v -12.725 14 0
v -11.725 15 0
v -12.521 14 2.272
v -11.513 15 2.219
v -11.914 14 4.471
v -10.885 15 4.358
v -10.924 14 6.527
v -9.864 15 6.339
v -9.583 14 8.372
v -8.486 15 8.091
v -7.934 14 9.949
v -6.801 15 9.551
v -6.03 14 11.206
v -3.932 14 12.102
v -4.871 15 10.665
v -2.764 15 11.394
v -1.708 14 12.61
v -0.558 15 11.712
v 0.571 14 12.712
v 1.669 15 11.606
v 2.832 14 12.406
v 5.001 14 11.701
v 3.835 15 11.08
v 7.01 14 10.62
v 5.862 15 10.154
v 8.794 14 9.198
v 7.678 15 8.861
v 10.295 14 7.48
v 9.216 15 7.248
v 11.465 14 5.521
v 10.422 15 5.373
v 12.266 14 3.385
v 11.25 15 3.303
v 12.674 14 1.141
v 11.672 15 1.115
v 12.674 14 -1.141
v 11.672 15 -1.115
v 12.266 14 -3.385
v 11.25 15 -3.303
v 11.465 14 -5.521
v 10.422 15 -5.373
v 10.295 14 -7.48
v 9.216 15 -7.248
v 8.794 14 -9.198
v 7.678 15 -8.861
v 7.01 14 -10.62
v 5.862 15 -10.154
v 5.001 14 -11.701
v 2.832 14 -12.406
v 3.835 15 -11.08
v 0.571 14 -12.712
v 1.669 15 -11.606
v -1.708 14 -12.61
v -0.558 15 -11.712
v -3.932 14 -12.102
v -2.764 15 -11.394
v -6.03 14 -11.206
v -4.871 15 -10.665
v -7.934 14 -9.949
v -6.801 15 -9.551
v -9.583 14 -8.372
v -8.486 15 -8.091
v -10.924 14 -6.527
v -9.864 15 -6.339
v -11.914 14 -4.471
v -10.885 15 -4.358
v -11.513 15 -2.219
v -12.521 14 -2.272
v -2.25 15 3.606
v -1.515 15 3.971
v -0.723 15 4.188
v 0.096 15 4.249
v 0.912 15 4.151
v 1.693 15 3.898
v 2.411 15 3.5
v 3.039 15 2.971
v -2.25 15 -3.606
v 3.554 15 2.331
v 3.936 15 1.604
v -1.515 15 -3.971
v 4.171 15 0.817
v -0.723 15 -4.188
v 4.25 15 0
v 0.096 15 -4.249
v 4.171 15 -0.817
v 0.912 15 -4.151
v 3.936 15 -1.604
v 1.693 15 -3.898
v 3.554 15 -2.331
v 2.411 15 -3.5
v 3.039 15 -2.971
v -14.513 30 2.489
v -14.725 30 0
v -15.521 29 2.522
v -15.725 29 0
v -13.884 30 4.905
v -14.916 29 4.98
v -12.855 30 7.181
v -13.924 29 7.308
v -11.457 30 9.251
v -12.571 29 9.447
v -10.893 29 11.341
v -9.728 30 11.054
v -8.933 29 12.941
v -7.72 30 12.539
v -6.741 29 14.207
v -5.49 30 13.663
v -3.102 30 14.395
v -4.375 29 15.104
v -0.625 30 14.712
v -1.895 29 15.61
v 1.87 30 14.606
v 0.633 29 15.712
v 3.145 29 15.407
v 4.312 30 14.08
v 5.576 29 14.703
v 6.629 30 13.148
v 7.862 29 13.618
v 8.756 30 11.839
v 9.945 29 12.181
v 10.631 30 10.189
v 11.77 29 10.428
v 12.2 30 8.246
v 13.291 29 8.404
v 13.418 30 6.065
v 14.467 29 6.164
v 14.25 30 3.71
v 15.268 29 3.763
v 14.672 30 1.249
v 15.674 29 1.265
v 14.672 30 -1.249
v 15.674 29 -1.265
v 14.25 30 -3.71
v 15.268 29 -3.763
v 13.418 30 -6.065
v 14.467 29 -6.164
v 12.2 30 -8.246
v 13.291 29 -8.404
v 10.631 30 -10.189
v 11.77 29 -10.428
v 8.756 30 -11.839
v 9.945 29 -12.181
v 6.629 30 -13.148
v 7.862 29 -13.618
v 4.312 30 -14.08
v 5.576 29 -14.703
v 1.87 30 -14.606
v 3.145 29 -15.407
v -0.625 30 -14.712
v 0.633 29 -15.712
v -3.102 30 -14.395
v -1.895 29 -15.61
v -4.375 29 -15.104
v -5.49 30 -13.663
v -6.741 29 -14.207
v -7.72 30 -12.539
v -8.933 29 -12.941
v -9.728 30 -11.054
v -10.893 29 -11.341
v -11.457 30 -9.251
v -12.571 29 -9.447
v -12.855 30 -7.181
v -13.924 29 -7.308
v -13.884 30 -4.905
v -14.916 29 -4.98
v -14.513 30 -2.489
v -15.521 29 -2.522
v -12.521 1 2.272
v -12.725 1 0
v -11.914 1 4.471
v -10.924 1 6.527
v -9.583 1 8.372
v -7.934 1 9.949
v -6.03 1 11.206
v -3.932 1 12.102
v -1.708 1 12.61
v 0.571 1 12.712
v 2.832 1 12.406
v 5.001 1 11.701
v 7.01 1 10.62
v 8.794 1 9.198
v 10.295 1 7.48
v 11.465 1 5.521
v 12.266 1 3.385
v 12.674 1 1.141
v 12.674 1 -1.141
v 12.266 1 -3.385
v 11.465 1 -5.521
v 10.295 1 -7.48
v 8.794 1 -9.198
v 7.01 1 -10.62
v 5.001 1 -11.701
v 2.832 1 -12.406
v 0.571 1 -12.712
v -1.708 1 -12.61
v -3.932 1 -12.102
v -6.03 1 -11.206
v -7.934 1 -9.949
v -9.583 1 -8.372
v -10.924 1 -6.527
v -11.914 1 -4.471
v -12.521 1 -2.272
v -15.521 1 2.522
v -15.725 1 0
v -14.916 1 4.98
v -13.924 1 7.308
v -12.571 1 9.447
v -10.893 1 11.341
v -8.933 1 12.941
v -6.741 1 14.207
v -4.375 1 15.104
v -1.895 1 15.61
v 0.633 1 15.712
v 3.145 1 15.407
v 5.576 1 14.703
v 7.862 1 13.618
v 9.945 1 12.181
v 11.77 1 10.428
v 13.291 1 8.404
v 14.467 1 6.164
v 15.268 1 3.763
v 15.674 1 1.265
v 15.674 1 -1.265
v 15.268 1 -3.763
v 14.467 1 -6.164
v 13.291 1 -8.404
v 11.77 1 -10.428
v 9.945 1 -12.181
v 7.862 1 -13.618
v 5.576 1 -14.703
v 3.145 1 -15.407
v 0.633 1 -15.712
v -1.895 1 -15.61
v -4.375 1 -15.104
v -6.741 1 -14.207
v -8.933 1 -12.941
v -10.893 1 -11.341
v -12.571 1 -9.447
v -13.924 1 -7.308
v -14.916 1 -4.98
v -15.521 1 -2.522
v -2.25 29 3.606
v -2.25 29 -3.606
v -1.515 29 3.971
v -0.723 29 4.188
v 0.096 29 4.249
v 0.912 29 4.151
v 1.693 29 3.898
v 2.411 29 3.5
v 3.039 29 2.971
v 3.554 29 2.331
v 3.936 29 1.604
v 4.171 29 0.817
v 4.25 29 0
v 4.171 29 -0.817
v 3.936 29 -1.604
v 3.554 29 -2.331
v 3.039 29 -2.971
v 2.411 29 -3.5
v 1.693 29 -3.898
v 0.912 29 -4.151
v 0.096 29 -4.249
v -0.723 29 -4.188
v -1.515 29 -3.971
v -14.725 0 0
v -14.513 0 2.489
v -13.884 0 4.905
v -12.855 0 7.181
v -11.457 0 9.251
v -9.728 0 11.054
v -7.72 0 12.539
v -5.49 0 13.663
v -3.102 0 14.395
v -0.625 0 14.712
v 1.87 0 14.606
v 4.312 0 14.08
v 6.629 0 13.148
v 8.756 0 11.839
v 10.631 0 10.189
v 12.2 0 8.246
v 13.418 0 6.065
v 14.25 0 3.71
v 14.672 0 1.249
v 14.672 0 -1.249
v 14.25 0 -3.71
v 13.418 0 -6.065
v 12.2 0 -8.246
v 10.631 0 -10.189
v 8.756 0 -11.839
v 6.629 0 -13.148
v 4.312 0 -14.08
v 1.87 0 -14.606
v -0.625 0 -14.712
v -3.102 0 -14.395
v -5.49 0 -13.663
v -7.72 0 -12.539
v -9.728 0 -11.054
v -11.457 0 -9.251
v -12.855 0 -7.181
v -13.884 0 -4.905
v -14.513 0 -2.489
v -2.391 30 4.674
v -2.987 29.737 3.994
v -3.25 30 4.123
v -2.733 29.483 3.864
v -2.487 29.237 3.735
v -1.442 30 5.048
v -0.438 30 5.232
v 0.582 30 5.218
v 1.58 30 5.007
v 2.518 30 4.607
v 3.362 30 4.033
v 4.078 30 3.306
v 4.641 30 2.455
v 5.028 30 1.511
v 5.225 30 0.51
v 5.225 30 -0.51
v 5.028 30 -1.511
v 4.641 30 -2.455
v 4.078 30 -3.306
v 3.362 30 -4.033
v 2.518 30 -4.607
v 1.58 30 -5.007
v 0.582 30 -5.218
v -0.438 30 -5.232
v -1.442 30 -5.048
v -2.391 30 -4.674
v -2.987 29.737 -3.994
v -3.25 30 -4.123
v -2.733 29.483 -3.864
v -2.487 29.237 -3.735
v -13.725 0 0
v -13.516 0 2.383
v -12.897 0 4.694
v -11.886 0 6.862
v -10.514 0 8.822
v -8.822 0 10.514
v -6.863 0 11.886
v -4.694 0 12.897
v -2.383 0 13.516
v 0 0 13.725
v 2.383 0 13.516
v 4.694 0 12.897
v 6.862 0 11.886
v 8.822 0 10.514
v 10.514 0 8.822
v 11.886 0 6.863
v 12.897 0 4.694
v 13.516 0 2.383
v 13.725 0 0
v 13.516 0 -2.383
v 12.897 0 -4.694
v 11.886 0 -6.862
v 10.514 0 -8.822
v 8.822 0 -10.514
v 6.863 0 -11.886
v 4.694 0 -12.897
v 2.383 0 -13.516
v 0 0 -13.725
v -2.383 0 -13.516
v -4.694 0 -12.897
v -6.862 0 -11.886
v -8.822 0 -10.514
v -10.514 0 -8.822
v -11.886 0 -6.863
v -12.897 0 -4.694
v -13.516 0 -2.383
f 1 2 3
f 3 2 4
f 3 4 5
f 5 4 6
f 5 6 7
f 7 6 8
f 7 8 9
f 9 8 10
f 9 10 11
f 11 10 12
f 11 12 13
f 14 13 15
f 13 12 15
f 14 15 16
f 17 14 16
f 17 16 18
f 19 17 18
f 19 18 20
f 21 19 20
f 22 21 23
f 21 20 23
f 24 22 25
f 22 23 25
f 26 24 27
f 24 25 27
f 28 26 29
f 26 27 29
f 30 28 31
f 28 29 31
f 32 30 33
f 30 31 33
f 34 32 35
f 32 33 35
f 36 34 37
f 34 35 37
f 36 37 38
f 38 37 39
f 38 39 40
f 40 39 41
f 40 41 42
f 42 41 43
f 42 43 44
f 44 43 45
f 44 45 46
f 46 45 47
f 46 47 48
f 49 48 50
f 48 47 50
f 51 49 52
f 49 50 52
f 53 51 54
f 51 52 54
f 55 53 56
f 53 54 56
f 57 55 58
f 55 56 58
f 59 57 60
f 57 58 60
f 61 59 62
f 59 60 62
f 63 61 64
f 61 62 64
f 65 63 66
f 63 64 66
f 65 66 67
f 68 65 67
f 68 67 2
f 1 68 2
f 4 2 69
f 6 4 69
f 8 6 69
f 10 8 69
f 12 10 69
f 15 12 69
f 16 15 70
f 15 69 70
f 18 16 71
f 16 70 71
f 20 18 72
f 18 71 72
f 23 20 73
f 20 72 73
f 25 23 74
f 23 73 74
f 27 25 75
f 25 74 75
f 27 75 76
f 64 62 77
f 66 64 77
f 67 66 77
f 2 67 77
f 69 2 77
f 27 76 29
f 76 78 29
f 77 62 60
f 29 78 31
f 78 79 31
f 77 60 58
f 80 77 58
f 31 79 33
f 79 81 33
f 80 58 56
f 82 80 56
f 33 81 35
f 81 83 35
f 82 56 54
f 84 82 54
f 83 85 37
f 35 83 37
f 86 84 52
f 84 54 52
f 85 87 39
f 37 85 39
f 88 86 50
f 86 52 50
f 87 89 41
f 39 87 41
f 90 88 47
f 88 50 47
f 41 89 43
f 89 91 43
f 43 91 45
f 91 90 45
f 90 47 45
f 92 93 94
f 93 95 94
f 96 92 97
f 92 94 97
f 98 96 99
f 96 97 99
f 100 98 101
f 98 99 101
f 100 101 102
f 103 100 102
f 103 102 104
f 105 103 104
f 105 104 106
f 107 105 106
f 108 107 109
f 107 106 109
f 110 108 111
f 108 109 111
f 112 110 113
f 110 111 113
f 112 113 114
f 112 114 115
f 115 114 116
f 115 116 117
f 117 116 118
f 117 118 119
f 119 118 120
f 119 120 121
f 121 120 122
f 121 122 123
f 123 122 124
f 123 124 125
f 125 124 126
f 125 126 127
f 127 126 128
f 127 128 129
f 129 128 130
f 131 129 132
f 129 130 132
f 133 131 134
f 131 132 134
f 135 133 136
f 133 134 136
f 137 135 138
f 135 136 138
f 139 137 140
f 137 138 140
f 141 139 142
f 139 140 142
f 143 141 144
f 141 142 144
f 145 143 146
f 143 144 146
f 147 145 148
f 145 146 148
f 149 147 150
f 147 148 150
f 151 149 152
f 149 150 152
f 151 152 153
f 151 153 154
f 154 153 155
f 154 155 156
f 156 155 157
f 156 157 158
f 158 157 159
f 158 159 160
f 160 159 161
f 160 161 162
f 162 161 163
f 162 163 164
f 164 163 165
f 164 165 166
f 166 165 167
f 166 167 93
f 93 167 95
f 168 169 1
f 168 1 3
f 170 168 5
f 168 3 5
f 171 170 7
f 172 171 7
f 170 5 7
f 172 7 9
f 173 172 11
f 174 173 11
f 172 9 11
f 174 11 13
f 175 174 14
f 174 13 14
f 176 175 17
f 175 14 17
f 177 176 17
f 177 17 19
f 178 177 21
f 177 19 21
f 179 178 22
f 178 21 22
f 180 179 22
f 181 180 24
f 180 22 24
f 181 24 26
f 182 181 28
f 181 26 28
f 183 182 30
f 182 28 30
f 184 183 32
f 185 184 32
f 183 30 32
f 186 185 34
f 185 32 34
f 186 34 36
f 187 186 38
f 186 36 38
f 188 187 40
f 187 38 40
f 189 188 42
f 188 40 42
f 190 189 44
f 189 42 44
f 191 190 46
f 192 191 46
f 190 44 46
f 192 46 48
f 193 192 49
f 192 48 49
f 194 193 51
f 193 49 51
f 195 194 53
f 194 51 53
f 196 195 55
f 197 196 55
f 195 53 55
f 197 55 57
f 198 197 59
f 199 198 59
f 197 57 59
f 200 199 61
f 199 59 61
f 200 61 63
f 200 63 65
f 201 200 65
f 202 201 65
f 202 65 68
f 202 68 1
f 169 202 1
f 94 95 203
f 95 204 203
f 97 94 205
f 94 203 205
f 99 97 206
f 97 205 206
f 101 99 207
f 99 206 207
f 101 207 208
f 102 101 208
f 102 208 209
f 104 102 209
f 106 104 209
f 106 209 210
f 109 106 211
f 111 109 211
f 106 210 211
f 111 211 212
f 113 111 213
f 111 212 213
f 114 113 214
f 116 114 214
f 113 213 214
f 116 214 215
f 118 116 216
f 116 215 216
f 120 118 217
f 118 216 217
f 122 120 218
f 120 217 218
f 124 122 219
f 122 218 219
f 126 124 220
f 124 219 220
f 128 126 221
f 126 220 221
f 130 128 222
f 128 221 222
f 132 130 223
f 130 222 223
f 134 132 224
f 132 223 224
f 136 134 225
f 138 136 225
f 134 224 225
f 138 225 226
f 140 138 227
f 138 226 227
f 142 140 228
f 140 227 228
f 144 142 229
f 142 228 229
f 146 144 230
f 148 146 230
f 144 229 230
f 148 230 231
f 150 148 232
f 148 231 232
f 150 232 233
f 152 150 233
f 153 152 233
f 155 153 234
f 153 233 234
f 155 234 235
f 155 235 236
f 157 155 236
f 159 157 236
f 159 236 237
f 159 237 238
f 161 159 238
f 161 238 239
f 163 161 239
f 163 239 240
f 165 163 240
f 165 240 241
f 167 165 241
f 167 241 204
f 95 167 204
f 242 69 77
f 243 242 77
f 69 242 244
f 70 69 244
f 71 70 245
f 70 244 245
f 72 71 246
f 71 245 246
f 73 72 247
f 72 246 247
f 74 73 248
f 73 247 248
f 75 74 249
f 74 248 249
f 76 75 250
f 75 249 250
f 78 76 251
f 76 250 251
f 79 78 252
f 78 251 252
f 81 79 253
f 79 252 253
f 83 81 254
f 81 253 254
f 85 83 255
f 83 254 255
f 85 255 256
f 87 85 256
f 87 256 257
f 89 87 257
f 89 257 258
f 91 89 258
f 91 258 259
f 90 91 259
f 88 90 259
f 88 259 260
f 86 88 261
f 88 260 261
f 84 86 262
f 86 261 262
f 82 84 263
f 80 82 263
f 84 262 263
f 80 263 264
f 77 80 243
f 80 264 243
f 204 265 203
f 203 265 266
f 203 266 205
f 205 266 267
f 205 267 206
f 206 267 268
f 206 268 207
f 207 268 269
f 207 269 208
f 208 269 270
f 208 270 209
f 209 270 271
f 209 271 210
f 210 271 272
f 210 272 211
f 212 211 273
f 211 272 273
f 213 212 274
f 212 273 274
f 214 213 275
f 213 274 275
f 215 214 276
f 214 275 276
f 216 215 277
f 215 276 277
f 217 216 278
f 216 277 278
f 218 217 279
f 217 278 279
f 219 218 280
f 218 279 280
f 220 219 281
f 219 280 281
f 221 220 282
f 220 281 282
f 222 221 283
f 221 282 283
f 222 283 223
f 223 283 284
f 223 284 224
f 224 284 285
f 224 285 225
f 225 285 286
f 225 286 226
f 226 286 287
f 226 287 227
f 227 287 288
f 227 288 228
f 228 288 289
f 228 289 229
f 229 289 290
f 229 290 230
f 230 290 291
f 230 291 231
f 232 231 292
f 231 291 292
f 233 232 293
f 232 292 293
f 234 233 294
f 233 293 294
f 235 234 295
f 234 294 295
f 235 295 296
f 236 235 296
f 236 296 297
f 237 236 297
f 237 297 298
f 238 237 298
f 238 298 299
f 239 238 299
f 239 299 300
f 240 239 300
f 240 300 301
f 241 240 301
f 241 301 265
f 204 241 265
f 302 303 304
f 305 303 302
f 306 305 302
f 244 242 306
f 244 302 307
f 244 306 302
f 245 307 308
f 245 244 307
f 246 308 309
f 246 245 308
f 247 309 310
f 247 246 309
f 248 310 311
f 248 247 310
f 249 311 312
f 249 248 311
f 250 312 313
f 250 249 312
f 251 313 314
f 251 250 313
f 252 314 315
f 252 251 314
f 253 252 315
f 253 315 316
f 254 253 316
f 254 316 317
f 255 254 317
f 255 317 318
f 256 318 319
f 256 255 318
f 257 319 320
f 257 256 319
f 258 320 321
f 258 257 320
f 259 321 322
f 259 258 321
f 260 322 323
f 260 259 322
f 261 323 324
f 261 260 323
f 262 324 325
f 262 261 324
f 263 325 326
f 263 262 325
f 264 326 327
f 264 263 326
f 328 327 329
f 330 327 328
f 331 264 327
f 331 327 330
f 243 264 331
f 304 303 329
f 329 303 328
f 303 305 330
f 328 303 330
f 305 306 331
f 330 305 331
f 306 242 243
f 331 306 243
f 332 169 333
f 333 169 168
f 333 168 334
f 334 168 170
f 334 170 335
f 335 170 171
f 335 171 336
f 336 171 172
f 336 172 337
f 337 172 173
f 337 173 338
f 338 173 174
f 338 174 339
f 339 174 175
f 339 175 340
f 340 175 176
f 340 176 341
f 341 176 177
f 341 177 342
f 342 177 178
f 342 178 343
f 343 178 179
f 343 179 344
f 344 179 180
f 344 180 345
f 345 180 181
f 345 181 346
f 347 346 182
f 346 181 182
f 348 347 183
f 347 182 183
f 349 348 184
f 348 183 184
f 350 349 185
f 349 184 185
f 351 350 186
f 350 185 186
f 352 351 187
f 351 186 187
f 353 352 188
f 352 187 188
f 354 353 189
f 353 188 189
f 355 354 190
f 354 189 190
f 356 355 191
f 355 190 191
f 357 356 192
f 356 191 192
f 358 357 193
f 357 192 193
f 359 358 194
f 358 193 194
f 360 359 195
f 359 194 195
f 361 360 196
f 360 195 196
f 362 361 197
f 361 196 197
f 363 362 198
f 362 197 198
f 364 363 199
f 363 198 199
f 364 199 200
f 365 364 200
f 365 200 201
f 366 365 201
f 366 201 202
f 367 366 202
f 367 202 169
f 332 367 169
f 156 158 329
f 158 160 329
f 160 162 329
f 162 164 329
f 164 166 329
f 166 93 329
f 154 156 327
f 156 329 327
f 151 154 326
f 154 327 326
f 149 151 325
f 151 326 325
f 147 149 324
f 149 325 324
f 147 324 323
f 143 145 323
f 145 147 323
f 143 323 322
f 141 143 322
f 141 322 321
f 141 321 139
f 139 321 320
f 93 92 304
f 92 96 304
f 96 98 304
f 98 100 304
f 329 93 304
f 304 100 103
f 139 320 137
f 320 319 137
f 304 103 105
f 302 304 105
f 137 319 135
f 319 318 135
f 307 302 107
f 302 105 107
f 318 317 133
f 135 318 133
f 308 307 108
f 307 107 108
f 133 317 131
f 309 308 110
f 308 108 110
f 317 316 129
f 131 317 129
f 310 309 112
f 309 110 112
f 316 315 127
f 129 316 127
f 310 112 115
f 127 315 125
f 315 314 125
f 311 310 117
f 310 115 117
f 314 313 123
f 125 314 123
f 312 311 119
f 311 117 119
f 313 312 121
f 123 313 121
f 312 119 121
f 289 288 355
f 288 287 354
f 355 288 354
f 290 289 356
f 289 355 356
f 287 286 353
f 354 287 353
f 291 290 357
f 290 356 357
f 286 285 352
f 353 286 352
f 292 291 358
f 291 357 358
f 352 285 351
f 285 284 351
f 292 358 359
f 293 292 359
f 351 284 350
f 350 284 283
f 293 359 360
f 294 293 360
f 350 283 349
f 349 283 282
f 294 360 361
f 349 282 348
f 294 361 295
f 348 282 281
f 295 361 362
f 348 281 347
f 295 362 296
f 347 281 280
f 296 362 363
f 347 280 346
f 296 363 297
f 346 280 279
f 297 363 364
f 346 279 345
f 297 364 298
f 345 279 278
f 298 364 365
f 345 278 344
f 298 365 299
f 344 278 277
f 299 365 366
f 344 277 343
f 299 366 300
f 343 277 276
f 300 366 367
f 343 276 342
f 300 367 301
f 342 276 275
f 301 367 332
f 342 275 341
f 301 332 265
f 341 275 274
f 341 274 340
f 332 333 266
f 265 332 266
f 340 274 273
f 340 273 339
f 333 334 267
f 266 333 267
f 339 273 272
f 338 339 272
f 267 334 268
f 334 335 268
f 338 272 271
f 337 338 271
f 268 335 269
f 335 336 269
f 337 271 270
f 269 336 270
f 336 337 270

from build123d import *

# Parameters (mm, degrees)
CROQUIS3_W              = 4
CROQUIS3_H              = 7.21110255
SALIENTE_EXTRUIR1_DEPTH = 15
CHAFL_N1_SIZE           = 1


with BuildPart() as part:
    # Croquis2 → Revolución1 (revolve)
    with BuildSketch(Plane.XY):
        Polygon((-4.25, 30), (-14.725, 30), (-15.725, 29), (-15.725, 1), (-14.725, 0), (-13.725, 0), (-12.725, 1), (-12.725, 14), (-11.725, 15), (-4.25, 15), align=None)
    revolve(axis=Axis((0, 0, 0), (0, 1, 0)))

    # Croquis3 → Saliente-Extruir1 (add)
    with BuildSketch(Plane(origin=(0, 30, 0), x_dir=(1, 0, 0), z_dir=(0, 1, 0))):
        with Locations((-4.25, 0)):
            Rectangle(CROQUIS3_W, CROQUIS3_H)
    extrude(amount=-SALIENTE_EXTRUIR1_DEPTH)

    # Chaflán1
    chafl_n1_edges = [part.edges().sort_by_distance(p)[0] for p in [
        (4.25, 30, 0),
        (-2.25, 30, 0),
    ]]
    chamfer(chafl_n1_edges, length=CHAFL_N1_SIZE)


solid = part.part
